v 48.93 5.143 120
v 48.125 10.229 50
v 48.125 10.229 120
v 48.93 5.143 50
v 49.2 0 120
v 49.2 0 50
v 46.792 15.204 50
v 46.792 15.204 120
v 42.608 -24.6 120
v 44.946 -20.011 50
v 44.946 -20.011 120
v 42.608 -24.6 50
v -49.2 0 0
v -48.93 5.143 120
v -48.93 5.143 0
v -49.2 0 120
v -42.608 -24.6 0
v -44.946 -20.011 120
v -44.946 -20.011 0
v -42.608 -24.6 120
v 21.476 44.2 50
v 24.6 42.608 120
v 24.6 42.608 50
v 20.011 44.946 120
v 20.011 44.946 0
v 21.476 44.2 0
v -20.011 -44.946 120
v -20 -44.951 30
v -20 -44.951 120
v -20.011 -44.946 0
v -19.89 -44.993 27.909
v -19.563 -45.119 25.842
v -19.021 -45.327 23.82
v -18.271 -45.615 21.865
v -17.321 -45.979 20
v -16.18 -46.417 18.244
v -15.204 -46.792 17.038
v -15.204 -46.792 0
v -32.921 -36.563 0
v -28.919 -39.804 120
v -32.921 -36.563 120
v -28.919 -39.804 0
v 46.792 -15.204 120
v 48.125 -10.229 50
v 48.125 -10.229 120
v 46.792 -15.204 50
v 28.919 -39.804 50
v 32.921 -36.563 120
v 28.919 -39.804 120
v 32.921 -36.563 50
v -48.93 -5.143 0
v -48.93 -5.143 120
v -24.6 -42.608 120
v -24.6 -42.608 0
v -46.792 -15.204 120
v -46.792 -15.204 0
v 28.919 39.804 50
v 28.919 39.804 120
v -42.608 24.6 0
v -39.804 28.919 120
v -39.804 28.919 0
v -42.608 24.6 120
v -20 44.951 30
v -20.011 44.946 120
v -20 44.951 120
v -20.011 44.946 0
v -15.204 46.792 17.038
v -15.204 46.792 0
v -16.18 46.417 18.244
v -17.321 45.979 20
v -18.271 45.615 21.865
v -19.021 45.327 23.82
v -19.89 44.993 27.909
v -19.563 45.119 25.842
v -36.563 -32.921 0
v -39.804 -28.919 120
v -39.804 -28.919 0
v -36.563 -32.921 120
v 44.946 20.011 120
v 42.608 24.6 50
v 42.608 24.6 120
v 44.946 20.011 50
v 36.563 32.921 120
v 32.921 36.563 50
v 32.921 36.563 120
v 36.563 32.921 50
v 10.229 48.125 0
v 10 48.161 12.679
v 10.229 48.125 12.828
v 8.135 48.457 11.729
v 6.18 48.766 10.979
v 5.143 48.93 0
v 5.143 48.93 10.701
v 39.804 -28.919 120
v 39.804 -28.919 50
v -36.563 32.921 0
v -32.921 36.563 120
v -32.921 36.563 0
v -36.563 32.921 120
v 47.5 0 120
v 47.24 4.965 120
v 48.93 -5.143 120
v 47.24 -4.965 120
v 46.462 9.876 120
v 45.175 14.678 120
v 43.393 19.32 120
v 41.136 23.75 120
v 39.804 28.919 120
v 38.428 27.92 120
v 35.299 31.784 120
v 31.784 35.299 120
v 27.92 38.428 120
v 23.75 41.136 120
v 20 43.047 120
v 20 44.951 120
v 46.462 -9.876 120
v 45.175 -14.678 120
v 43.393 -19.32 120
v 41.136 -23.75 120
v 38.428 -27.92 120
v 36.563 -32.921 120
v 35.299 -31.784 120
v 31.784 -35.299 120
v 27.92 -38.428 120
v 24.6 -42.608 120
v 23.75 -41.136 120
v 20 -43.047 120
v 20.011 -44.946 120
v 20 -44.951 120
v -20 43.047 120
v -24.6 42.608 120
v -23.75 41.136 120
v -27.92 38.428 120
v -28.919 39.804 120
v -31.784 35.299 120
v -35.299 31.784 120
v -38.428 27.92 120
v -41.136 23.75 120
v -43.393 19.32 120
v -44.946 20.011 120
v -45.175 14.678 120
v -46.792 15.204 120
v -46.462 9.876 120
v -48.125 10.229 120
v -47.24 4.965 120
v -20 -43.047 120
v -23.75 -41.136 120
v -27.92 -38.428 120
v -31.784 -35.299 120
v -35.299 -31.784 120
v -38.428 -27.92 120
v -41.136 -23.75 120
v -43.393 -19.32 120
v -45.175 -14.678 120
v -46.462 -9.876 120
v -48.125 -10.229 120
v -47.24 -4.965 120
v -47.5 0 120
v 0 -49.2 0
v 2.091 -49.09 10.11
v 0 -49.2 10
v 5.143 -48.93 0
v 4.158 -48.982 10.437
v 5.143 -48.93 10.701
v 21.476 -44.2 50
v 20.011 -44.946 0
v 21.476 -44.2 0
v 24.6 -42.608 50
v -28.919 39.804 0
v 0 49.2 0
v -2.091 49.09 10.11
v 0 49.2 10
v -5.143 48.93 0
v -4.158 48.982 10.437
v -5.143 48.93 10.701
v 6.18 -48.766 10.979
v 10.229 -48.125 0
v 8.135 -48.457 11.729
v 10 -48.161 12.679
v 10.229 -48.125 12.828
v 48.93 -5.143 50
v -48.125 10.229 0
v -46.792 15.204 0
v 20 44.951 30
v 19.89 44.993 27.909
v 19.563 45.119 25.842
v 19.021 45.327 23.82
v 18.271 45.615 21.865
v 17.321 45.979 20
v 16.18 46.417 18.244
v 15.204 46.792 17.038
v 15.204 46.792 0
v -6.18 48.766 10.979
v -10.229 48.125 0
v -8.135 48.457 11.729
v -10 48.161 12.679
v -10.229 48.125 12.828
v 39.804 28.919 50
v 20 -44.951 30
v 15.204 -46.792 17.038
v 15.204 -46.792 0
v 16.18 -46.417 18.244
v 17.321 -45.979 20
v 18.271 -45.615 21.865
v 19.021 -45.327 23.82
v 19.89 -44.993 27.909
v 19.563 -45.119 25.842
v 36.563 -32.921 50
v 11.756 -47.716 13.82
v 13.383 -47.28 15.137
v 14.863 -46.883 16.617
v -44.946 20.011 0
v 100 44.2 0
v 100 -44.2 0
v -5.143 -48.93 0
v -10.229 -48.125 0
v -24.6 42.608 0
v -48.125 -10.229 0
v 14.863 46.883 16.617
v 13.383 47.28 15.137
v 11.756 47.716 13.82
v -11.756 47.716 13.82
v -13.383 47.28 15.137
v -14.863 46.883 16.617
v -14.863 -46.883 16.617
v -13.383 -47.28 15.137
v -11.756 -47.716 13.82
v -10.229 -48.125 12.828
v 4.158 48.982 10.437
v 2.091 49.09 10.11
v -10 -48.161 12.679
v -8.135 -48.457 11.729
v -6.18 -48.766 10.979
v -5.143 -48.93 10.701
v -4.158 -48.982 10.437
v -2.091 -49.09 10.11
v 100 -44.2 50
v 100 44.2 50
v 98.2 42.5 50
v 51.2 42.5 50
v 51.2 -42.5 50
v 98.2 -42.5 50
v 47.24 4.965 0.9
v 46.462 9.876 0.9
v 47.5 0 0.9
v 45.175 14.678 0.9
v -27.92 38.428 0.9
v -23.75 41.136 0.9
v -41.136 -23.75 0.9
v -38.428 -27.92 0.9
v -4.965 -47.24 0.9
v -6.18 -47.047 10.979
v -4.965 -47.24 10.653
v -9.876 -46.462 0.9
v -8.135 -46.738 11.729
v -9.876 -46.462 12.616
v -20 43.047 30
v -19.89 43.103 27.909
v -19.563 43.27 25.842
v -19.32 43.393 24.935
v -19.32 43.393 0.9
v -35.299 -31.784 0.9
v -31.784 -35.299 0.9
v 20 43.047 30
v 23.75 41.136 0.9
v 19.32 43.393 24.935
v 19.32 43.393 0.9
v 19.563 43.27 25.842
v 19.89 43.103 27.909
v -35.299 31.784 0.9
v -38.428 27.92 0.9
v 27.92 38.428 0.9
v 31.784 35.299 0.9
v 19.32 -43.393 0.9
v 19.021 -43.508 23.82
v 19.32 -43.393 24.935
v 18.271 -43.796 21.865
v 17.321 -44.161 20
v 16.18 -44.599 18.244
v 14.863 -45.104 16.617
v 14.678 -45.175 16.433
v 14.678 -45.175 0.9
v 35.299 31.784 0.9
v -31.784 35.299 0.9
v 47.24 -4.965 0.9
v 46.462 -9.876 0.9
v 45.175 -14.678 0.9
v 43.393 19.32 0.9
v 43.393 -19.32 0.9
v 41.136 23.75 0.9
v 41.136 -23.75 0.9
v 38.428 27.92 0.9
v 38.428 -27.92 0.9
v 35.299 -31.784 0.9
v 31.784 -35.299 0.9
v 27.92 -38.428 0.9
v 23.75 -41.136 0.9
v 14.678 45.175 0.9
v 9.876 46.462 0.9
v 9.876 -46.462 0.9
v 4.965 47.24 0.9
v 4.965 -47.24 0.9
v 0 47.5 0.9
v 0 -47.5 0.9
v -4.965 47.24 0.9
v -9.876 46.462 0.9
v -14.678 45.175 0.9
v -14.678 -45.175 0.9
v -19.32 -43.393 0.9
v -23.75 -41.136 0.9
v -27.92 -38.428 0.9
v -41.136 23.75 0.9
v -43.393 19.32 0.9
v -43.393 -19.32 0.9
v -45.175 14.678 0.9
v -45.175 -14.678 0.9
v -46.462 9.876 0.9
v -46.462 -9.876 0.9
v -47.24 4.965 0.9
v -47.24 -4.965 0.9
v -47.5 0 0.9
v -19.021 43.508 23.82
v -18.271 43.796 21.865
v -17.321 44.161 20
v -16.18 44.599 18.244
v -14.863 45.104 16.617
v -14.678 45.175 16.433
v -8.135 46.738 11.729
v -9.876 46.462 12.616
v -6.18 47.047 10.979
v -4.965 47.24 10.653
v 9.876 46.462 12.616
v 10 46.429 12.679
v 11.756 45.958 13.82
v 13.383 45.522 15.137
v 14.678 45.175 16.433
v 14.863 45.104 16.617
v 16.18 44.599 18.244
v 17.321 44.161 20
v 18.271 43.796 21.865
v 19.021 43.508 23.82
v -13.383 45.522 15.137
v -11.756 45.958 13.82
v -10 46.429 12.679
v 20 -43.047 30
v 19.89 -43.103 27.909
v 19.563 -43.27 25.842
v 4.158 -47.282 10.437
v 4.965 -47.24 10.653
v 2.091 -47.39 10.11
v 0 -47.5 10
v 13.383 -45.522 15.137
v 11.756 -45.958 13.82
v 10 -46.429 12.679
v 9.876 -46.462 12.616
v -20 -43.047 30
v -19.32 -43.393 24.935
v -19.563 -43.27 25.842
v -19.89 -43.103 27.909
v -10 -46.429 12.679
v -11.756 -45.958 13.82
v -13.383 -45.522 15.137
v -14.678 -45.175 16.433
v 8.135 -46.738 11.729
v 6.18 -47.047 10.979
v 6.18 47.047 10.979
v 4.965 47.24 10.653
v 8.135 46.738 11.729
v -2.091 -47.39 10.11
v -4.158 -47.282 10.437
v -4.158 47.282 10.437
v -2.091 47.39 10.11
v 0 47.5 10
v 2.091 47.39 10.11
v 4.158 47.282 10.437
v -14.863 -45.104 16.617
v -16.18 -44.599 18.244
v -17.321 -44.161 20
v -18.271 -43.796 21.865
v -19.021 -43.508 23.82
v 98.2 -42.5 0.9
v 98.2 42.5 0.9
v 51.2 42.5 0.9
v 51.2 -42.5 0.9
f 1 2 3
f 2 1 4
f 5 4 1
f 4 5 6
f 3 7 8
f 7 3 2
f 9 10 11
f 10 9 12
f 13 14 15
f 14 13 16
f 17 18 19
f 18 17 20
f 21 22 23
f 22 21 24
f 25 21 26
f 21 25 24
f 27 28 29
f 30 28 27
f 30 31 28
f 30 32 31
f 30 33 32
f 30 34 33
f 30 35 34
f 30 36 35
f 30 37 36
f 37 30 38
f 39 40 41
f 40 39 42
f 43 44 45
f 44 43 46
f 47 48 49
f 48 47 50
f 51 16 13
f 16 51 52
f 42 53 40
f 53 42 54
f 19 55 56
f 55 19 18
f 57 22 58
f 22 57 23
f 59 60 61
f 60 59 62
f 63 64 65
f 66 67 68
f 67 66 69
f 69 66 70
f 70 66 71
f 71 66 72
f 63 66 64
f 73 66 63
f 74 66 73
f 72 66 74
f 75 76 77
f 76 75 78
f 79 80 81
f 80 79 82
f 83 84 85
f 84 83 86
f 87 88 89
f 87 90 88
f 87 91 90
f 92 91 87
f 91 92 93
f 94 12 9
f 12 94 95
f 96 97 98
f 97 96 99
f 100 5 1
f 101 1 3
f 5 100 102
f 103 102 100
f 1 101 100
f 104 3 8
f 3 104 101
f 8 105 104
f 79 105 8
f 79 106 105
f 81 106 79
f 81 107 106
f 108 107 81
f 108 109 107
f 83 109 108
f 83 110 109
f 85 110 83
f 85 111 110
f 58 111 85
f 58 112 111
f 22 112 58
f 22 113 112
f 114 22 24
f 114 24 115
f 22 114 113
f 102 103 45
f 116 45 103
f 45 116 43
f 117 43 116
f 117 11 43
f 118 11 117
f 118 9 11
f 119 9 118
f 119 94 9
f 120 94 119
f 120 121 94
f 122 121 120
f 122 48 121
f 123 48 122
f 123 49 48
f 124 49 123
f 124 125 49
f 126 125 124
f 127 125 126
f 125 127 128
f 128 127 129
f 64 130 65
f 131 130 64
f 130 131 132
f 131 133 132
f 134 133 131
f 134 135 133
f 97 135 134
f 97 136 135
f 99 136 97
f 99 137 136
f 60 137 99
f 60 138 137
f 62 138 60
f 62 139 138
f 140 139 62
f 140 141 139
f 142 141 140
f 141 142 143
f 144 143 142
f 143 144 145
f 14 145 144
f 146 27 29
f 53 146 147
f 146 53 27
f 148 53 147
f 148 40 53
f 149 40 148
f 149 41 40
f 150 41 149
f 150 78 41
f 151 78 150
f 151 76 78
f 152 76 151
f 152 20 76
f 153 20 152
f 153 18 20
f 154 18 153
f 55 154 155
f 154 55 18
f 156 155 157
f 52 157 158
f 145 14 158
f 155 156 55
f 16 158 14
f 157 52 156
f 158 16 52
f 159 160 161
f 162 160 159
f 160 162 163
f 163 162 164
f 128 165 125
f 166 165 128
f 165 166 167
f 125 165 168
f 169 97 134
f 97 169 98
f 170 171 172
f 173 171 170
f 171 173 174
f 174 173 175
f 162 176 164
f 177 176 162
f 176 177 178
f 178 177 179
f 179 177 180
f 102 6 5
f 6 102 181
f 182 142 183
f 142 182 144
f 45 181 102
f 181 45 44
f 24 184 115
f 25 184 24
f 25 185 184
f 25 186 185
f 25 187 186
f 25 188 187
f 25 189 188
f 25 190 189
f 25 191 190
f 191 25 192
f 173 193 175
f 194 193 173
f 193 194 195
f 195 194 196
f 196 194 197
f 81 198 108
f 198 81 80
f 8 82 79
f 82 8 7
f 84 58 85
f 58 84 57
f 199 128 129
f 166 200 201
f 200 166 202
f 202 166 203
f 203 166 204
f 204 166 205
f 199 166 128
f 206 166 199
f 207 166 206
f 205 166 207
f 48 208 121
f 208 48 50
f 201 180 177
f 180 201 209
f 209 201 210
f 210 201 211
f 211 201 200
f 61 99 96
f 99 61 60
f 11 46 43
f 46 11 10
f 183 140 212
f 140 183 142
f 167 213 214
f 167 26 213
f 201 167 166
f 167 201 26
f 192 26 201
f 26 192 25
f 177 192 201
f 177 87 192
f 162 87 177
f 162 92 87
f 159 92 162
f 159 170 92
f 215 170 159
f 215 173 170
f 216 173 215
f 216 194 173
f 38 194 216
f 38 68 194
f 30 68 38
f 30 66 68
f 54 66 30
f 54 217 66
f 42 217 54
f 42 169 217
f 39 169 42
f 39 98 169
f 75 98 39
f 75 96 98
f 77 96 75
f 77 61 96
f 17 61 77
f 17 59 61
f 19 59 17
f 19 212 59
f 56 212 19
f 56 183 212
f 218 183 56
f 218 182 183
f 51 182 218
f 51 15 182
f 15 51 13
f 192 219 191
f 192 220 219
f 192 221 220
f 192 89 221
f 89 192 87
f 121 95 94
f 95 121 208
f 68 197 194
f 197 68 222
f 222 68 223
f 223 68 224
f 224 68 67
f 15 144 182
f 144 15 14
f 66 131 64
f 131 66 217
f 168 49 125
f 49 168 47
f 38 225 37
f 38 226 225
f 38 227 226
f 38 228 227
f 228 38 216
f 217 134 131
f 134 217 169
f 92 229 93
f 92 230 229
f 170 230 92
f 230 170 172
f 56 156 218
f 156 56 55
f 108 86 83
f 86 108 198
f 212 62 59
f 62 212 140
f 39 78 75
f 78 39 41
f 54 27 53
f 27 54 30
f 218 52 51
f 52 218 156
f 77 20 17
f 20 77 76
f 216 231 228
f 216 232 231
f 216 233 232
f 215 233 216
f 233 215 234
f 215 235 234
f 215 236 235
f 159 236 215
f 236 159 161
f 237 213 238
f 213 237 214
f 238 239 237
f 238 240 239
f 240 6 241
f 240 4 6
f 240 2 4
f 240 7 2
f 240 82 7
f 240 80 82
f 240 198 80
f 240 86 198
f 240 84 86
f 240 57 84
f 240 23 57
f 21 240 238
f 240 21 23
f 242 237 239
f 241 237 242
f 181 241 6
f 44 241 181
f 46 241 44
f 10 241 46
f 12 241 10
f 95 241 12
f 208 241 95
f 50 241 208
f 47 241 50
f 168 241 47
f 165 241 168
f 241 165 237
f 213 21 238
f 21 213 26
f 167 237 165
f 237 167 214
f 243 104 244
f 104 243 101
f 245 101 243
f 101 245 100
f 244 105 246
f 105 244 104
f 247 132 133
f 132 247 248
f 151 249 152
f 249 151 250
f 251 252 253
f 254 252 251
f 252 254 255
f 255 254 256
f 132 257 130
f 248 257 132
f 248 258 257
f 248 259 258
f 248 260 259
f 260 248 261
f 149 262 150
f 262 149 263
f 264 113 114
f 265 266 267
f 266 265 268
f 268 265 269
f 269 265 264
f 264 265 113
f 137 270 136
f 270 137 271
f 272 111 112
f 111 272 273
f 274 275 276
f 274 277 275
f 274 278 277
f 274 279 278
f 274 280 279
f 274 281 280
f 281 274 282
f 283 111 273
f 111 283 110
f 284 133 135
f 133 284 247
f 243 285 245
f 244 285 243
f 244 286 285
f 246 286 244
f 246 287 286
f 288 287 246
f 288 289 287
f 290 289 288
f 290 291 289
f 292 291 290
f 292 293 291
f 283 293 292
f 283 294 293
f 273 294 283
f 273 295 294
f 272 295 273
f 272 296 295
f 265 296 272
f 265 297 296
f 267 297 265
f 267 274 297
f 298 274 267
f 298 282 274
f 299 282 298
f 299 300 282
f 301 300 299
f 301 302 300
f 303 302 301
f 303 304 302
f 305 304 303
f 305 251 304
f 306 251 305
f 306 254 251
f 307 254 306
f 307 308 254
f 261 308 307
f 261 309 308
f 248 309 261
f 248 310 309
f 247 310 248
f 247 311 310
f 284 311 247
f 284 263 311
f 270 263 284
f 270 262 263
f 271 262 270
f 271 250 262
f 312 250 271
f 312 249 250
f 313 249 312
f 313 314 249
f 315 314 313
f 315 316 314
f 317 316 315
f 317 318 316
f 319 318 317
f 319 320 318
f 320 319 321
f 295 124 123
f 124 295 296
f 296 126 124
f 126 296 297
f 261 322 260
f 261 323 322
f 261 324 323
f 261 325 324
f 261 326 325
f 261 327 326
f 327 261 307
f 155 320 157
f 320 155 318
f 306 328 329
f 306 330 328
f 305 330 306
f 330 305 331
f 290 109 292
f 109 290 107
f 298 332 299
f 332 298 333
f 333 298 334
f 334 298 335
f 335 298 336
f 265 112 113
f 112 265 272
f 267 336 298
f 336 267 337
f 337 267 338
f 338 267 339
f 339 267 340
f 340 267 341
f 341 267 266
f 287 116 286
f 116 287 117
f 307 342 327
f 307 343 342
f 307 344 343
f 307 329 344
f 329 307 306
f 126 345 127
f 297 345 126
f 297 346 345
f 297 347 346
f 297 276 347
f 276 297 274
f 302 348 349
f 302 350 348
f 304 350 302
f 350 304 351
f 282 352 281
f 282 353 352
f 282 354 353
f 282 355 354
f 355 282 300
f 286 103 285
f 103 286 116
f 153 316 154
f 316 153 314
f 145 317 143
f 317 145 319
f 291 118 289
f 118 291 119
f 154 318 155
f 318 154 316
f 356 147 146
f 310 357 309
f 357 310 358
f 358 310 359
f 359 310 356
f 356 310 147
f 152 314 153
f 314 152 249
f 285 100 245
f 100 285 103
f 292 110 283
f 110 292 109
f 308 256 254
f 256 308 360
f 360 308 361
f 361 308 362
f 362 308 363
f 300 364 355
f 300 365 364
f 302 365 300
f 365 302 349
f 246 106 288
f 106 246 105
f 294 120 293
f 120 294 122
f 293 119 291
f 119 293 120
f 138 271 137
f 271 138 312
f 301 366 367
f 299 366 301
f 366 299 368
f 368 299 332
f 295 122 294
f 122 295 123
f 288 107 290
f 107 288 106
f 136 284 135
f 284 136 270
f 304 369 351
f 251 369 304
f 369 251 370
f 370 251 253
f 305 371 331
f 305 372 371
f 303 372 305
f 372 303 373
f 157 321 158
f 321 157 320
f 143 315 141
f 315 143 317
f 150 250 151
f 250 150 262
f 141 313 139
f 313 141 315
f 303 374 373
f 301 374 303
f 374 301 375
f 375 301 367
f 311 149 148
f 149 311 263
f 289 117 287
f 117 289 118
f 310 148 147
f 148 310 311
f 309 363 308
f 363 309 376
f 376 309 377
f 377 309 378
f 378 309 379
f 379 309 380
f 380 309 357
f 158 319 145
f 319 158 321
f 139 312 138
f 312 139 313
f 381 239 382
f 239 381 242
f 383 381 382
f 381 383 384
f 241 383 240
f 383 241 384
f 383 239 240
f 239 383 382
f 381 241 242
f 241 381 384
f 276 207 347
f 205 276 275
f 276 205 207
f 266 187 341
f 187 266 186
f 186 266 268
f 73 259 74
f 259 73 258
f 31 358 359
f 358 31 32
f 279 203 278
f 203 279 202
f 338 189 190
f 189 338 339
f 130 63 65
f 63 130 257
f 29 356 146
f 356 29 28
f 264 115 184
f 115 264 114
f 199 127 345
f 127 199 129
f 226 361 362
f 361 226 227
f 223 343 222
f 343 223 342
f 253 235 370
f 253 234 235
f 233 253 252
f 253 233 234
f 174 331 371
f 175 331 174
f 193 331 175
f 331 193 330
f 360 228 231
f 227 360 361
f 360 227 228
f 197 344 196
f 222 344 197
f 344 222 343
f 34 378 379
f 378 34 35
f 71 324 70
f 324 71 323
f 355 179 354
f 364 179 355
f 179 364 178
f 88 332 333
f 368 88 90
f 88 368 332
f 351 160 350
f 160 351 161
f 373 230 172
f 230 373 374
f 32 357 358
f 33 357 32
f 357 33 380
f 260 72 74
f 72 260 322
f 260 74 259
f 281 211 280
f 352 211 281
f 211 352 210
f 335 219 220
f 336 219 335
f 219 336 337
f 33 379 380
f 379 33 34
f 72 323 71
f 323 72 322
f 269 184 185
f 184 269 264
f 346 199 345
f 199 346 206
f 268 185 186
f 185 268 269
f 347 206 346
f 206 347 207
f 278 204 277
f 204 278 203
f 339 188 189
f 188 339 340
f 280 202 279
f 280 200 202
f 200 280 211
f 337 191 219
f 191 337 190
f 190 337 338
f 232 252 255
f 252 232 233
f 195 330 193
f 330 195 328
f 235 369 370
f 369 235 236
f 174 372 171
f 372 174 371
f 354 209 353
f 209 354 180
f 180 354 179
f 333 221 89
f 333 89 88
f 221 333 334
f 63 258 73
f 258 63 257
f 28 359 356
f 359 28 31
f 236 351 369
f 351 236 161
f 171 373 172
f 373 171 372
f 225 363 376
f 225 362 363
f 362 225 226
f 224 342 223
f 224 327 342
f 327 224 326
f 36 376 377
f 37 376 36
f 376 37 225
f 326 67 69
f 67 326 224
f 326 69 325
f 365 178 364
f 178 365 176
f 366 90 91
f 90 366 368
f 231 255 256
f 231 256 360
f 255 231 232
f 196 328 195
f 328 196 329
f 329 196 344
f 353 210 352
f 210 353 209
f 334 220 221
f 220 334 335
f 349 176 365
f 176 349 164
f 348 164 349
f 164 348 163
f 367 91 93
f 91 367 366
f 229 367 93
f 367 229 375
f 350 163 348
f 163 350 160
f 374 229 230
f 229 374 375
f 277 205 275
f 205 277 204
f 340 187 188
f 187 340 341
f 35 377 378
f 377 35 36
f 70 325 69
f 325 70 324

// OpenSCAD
ringID=95;
ringOD=95+2*1.7;

topID=85;
topOD=85+2*1.7;

$fn=60;

difference() {
   union() {
      cylinder(d=ringOD, h=120);
      translate([0,-topOD/2,0]) cube([100,topOD,50]);
   }
   union() /* remove */ {
      translate([0,0,0.9]) cylinder(d=ringID, h=140);
      translate([ringOD/2+2,-topID/2,0.9]) cube([47,topID,60]);
      translate([0,60,30]) rotate([90,0,0]) hull() {
         cylinder(d=40,h=120);
         translate([-20,0,0]) cube([40,100,120]);
      }
   }
}
